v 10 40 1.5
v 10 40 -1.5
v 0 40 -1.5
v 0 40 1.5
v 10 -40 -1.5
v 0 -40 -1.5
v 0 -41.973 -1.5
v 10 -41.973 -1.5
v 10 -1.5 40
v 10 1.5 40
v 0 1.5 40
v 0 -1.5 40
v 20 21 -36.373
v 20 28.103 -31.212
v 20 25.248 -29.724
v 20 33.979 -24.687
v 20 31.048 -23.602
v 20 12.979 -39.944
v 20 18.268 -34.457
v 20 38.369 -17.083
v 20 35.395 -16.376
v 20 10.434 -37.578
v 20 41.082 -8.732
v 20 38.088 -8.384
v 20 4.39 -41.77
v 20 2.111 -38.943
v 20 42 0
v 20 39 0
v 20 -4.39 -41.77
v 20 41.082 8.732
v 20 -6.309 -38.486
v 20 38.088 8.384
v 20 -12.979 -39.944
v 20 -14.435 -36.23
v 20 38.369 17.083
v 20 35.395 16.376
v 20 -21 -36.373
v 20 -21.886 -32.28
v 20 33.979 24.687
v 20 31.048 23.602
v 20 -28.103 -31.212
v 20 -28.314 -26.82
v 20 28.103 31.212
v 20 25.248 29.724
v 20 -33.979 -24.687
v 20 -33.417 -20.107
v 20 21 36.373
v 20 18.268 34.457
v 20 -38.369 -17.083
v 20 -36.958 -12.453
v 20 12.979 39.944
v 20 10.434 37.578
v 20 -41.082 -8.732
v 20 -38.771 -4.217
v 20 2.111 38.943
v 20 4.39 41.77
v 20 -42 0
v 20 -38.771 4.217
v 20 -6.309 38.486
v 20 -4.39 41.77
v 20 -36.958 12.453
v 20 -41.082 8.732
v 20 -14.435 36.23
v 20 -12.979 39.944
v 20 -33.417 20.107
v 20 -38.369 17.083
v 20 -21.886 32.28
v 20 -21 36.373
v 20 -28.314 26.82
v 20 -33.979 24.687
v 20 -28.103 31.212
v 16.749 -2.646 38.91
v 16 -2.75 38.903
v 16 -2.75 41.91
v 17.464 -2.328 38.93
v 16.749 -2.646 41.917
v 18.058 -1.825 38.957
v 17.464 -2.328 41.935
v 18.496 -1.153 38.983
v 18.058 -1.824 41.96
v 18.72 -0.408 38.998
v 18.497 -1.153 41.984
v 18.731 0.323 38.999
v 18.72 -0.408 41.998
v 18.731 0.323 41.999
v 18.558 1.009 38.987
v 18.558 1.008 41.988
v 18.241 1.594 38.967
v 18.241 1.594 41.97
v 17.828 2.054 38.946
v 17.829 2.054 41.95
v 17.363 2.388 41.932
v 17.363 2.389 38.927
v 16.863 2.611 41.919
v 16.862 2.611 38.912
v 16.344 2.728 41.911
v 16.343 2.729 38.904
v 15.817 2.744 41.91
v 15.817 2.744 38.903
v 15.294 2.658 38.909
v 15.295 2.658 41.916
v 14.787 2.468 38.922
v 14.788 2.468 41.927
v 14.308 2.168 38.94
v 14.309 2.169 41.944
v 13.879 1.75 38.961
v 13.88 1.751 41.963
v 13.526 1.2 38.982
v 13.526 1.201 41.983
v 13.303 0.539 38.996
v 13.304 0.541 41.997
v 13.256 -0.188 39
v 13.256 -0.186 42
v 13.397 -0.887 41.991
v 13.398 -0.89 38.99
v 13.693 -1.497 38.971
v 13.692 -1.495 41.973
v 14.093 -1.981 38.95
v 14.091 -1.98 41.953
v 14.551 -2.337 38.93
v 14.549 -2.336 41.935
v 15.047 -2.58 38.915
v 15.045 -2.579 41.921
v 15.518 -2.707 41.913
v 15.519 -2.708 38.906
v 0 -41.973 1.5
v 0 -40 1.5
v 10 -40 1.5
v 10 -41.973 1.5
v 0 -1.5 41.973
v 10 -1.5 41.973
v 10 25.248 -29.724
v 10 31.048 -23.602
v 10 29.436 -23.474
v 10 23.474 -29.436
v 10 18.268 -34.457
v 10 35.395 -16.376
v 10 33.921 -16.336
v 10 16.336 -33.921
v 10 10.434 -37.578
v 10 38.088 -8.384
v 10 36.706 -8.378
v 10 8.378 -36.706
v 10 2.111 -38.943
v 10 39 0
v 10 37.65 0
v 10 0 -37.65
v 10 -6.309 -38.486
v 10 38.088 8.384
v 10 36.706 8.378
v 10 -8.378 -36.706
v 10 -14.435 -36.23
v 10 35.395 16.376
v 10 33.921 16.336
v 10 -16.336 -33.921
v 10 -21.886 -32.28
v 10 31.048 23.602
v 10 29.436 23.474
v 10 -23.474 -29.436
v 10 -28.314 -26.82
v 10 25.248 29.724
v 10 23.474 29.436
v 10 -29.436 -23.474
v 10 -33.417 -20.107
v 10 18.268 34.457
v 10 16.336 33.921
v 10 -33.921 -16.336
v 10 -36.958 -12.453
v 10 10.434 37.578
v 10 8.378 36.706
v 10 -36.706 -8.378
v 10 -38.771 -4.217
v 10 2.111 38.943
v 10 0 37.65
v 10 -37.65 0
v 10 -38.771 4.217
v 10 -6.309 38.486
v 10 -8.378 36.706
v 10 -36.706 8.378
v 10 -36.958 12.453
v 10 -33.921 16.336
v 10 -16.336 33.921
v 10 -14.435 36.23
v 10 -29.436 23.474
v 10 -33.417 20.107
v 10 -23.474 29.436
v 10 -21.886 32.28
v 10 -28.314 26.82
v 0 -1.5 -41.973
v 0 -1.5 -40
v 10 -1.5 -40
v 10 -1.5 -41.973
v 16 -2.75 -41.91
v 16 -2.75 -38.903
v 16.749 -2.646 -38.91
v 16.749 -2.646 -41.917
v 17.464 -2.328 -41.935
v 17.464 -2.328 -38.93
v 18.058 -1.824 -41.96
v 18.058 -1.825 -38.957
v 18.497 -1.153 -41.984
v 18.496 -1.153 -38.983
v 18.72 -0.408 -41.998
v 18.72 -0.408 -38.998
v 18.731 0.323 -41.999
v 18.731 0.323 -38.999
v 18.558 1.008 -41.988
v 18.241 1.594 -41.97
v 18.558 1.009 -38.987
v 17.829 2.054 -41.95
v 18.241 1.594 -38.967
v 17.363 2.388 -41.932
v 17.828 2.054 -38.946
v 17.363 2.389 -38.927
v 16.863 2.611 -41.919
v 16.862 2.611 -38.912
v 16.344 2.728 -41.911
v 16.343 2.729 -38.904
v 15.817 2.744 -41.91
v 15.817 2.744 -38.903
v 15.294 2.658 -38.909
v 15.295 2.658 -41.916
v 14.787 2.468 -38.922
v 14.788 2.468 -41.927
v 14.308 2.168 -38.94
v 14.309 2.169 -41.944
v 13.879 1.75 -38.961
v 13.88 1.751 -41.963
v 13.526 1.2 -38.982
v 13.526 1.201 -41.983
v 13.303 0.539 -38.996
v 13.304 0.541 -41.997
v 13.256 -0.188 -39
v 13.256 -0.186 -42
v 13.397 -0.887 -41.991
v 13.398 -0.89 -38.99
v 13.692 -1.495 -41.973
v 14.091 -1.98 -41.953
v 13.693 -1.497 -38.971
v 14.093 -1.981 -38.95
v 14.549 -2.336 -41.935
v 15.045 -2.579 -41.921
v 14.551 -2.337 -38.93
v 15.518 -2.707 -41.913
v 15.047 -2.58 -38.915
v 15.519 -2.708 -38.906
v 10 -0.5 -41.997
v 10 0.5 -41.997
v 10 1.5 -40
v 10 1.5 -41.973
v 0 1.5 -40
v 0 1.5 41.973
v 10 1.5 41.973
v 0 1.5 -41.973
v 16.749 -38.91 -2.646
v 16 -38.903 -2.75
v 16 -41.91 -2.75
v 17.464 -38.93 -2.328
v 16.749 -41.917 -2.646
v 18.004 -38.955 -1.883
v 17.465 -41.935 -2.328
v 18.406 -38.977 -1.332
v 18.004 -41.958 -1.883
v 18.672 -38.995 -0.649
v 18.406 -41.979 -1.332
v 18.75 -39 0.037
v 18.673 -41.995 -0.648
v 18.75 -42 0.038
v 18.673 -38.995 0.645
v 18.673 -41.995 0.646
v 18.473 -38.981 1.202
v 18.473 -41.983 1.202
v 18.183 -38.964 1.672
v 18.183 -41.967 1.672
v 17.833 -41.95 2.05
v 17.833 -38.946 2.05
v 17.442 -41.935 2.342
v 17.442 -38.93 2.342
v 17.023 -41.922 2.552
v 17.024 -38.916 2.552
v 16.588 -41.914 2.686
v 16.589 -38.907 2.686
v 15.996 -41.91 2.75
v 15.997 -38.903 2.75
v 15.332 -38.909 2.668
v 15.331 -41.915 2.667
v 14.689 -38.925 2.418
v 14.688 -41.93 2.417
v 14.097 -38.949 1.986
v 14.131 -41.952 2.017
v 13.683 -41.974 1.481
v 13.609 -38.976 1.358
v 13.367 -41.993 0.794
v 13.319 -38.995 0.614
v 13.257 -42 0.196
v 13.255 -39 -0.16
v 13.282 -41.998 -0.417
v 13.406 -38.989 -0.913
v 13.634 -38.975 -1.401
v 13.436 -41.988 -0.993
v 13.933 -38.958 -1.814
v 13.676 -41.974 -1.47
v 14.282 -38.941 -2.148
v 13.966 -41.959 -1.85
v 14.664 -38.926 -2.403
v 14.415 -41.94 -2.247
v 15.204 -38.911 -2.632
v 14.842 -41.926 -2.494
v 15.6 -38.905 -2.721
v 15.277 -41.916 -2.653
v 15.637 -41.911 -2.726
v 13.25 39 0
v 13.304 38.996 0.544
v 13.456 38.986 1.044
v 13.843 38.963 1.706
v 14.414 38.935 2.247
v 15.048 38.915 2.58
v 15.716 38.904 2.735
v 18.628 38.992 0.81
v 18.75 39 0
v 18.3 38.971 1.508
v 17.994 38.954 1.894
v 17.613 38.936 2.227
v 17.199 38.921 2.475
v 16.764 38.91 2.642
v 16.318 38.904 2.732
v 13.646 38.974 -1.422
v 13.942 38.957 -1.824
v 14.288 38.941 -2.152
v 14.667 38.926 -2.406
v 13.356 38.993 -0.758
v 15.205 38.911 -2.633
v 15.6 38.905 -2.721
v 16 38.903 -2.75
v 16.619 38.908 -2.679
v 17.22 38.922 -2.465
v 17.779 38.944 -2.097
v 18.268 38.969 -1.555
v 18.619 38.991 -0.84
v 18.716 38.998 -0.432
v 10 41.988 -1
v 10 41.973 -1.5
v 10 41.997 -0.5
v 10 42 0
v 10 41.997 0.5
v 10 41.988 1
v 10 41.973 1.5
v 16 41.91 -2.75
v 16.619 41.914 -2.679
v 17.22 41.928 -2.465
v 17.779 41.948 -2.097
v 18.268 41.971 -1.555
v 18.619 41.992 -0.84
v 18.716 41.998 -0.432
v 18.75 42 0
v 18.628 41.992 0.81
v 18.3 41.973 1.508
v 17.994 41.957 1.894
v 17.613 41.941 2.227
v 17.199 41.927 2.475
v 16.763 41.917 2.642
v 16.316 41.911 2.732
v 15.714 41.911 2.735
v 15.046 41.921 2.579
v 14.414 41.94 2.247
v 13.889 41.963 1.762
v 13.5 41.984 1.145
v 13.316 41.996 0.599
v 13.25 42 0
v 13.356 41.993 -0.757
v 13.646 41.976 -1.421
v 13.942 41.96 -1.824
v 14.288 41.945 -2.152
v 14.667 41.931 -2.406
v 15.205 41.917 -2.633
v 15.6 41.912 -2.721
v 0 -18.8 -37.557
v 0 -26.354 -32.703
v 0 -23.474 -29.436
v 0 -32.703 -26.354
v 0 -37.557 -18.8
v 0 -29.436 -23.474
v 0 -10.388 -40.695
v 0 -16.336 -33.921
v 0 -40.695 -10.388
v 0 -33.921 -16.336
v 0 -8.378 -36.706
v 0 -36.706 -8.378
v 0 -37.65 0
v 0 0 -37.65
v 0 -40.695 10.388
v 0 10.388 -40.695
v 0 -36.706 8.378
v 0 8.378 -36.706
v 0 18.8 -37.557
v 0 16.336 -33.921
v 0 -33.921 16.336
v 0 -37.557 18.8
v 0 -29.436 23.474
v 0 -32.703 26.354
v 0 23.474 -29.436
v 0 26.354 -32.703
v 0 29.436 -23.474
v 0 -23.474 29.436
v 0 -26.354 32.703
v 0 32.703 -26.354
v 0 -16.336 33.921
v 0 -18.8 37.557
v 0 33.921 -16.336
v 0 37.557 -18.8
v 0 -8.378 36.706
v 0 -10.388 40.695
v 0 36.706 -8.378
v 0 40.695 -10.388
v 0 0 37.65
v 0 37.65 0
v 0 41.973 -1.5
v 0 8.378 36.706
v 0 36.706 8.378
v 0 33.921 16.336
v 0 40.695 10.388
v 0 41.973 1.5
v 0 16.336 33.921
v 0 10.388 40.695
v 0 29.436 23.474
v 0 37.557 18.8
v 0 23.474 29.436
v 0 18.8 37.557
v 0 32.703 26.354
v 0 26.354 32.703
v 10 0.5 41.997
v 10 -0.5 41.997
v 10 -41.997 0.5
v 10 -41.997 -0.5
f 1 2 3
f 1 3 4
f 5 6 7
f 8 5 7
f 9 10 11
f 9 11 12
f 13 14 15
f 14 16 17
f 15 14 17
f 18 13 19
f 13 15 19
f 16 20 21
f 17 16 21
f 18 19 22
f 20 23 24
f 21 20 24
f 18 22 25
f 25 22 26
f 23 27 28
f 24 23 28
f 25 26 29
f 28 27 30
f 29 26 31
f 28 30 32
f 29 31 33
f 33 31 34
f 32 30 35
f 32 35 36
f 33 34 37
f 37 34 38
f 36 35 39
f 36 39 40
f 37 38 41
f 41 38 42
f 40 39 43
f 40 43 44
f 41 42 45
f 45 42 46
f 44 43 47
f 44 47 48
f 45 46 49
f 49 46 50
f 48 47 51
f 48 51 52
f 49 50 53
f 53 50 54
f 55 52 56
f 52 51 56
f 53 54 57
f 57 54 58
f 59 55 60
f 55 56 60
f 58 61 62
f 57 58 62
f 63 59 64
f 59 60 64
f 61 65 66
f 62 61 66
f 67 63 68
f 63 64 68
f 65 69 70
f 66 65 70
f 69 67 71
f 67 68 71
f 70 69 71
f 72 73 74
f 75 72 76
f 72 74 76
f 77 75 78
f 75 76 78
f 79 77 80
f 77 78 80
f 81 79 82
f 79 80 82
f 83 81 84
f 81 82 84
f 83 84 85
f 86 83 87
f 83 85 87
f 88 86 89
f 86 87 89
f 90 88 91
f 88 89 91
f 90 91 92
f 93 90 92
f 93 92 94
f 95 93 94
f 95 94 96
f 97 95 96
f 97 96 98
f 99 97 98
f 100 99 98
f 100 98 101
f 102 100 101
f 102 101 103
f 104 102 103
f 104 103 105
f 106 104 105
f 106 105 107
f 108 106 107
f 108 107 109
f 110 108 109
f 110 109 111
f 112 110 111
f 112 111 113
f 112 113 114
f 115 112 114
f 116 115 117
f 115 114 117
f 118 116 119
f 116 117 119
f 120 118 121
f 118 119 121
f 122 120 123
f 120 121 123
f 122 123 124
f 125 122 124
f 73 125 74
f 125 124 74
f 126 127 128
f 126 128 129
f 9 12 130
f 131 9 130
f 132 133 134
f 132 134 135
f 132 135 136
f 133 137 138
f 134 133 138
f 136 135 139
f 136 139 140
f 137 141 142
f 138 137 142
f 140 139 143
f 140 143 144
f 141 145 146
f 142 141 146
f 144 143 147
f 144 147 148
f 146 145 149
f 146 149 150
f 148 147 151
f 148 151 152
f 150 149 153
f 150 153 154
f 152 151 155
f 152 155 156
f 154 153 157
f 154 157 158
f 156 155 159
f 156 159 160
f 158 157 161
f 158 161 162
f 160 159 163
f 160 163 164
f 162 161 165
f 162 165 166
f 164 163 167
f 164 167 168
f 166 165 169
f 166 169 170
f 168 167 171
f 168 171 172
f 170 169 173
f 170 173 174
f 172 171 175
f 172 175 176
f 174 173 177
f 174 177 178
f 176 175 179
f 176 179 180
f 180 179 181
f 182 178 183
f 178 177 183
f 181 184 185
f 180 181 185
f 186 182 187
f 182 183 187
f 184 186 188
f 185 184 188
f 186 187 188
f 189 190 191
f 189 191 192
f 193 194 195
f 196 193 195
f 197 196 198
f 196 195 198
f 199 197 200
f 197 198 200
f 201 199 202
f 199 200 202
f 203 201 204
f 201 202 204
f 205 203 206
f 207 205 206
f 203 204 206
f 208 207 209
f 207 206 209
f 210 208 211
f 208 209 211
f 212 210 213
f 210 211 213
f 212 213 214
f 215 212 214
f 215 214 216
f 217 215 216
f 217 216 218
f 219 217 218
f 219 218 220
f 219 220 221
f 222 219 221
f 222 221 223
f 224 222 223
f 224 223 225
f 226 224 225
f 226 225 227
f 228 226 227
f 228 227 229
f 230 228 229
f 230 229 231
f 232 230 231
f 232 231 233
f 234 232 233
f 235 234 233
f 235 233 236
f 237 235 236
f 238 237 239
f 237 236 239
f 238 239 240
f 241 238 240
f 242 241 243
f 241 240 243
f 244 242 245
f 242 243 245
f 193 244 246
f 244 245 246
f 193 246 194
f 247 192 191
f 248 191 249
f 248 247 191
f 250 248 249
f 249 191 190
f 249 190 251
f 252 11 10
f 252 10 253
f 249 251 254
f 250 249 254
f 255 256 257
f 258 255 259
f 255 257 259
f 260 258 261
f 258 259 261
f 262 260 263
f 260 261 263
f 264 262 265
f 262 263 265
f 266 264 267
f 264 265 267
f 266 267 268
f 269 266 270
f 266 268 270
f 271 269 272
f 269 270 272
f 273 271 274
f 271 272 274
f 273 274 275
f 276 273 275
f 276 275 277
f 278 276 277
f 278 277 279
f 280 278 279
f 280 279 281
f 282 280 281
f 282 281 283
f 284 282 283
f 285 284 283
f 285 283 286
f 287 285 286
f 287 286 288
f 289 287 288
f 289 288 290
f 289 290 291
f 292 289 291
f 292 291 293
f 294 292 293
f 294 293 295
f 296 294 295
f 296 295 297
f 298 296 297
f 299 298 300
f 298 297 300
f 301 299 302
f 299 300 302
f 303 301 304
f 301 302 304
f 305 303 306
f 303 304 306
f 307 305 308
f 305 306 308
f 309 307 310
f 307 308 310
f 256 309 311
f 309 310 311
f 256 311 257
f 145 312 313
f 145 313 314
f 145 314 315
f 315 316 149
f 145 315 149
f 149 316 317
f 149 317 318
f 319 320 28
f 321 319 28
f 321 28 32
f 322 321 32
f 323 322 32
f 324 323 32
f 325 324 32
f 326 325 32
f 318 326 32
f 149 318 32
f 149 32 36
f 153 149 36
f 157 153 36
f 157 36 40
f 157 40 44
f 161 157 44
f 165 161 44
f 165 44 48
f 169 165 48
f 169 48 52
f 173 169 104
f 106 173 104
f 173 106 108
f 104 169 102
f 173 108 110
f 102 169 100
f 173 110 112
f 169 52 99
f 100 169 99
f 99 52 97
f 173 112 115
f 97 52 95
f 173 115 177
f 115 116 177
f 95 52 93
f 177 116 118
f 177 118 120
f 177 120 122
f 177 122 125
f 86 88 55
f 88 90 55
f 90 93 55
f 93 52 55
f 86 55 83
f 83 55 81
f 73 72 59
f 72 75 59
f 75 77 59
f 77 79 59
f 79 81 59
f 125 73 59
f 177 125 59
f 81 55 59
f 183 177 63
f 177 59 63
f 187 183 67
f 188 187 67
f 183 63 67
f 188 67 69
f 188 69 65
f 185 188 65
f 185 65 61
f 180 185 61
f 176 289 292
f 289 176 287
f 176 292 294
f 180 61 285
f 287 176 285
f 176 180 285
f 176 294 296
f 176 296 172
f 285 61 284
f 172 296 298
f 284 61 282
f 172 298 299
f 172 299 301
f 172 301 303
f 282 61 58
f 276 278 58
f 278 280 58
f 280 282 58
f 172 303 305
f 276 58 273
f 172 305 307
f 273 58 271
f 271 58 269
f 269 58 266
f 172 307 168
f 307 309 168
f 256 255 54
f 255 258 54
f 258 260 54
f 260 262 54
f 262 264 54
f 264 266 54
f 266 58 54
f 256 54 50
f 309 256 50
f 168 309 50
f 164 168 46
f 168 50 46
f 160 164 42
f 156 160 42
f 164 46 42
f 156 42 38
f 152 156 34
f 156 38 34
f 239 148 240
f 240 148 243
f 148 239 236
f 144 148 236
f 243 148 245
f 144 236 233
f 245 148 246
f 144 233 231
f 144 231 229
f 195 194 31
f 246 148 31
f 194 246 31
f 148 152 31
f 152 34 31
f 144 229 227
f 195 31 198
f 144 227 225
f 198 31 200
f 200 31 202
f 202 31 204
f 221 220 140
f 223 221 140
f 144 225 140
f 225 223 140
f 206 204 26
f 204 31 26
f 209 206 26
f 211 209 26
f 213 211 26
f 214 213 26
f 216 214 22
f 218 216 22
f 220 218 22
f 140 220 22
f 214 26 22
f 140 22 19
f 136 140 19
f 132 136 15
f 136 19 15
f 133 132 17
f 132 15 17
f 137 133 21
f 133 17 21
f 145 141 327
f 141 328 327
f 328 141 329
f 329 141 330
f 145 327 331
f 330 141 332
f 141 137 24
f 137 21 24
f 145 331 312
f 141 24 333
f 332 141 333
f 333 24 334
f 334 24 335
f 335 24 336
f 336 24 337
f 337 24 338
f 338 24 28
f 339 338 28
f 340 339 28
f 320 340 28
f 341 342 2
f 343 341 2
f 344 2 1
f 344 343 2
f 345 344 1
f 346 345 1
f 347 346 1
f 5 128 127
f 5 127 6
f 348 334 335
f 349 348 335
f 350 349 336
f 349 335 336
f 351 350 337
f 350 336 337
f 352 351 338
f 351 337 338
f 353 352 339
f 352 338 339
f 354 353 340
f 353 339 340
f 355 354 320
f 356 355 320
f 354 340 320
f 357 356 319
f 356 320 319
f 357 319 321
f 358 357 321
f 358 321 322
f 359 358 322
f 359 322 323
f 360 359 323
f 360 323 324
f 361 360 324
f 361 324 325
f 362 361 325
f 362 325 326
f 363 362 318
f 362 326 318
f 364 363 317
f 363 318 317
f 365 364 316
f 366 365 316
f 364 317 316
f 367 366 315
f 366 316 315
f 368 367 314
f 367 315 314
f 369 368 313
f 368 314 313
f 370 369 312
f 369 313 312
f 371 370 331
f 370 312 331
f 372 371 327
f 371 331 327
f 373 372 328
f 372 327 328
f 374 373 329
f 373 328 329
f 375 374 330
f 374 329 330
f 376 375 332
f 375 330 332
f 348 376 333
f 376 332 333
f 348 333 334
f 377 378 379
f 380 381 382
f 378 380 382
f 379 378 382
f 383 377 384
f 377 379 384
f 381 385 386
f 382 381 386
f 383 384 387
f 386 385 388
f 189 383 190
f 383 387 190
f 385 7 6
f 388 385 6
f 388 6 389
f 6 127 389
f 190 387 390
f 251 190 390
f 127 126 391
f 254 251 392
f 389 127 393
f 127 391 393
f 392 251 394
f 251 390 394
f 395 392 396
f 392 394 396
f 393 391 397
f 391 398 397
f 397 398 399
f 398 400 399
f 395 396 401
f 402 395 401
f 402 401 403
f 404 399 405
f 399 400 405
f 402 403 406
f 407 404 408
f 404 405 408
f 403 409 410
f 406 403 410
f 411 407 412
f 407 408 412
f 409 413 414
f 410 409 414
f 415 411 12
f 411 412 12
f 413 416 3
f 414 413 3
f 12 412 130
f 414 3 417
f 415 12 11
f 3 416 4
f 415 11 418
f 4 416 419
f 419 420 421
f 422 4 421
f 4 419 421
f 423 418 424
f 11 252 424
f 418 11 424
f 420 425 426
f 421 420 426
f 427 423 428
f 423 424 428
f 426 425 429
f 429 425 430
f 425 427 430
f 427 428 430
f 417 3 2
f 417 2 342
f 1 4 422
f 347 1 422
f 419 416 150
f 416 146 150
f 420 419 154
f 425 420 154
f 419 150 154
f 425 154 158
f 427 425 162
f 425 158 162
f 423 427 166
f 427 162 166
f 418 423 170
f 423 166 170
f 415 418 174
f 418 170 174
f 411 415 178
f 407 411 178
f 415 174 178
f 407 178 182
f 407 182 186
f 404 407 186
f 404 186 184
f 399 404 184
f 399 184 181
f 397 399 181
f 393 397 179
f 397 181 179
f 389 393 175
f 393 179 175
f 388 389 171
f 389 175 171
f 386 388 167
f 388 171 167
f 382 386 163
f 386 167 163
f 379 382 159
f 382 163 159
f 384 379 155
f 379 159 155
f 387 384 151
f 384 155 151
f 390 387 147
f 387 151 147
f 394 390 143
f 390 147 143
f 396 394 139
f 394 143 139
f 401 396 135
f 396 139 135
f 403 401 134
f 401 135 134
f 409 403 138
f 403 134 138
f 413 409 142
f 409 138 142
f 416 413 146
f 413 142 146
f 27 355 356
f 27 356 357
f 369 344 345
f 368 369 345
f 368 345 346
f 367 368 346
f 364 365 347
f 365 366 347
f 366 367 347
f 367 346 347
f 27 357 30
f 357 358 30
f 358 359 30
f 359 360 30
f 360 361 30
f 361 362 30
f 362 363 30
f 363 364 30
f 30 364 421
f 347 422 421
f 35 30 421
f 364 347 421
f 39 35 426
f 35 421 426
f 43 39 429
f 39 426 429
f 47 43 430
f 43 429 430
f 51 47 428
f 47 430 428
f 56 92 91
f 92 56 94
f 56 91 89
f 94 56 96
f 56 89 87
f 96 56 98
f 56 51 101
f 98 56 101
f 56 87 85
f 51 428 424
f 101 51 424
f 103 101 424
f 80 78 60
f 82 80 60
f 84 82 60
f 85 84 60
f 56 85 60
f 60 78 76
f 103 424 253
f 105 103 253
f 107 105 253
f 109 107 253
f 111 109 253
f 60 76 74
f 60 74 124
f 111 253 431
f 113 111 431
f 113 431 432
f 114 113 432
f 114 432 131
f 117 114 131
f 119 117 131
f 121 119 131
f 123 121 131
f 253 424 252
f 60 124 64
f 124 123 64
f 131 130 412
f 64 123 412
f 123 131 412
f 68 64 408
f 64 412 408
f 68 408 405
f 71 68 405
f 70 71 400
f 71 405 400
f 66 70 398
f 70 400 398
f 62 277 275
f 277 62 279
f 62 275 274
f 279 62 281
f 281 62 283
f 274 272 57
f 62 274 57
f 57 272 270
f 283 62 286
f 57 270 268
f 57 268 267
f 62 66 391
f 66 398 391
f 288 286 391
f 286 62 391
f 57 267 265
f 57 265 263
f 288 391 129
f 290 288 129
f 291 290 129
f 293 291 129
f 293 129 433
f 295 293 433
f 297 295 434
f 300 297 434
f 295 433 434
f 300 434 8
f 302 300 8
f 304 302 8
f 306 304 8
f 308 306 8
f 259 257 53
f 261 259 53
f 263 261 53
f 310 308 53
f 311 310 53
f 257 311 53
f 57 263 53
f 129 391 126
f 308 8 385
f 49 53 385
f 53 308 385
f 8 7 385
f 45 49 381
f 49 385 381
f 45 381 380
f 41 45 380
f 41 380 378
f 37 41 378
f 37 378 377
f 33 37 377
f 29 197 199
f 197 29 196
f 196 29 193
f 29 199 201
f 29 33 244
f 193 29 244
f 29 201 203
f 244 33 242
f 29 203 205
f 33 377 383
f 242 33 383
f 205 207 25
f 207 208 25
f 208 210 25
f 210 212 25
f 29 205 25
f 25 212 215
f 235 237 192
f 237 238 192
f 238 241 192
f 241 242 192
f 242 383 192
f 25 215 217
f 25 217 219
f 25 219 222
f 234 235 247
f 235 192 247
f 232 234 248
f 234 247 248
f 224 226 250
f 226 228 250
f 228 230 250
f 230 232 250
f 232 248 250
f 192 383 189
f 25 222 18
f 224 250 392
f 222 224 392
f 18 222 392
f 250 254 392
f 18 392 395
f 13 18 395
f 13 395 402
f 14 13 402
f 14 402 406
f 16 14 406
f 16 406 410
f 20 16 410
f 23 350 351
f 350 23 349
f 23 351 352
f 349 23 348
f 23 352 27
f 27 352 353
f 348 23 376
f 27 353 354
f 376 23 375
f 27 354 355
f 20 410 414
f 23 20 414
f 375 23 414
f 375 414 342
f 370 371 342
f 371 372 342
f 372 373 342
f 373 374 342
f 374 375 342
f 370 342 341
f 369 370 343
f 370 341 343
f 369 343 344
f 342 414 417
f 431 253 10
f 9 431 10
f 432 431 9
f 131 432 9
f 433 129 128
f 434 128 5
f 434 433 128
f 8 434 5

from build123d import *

# Parameters (mm, degrees)
D_GAGEMENT_M51_D             = 5.5
R_P_TITION_CIRCULAIRE1_COUNT = 2
R_P_TITION_CIRCULAIRE1_ANGLE = 90
ESQUISSE5_W                  = 3
ESQUISSE5_H                  = 15
ENL_V_MAT_EXTRU_1_DEPTH      = 10
R_P_TITION_CIRCULAIRE2_COUNT = 4


with BuildPart() as part:
    # Esquisse1 → Révolution1 (revolve)
    with BuildSketch(Plane.XY):
        Polygon((0, 37.65), (10, 37.65), (10, 39), (20, 39), (20, 42), (0, 42), align=None)
    revolve(axis=Axis((0, 0, 0), (1, 0, 0)))

    # Dégagement M51 (through all)
    with Locations(Plane(origin=(16, 42, 0), x_dir=(0, 0, 1), z_dir=(0, 1, 0))):
        with Locations((0, 0)):
            d_gagement_m51 = Hole(D_GAGEMENT_M51_D / 2)

    # Répétition circulaire1: Dégagement M51 ×2 about axis
    r_p_tition_circulaire1_axis = Axis((20, 0, 0), (-1, 0, 0))
    for i in range(1, R_P_TITION_CIRCULAIRE1_COUNT):
        add(d_gagement_m51.rotate(r_p_tition_circulaire1_axis, i * R_P_TITION_CIRCULAIRE1_ANGLE / (R_P_TITION_CIRCULAIRE1_COUNT - 1)), mode=Mode.SUBTRACT)

    # Esquisse5 → Enlèv. mat.-Extru.1 (cut)
    with BuildSketch(Plane.ZY):
        with Locations((0, 47.5)):
            Rectangle(ESQUISSE5_W, ESQUISSE5_H)
    enl_v_mat_extru_1 = extrude(amount=-ENL_V_MAT_EXTRU_1_DEPTH, mode=Mode.SUBTRACT)

    # Répétition circulaire2: Enlèv. mat.-Extru.1 ×4 about axis
    r_p_tition_circulaire2_axis = Axis((0, 0, 0), (1, 0, 0))
    for i in range(1, R_P_TITION_CIRCULAIRE2_COUNT):
        add(enl_v_mat_extru_1.rotate(r_p_tition_circulaire2_axis, i * 360 / R_P_TITION_CIRCULAIRE2_COUNT), mode=Mode.SUBTRACT)


solid = part.part
